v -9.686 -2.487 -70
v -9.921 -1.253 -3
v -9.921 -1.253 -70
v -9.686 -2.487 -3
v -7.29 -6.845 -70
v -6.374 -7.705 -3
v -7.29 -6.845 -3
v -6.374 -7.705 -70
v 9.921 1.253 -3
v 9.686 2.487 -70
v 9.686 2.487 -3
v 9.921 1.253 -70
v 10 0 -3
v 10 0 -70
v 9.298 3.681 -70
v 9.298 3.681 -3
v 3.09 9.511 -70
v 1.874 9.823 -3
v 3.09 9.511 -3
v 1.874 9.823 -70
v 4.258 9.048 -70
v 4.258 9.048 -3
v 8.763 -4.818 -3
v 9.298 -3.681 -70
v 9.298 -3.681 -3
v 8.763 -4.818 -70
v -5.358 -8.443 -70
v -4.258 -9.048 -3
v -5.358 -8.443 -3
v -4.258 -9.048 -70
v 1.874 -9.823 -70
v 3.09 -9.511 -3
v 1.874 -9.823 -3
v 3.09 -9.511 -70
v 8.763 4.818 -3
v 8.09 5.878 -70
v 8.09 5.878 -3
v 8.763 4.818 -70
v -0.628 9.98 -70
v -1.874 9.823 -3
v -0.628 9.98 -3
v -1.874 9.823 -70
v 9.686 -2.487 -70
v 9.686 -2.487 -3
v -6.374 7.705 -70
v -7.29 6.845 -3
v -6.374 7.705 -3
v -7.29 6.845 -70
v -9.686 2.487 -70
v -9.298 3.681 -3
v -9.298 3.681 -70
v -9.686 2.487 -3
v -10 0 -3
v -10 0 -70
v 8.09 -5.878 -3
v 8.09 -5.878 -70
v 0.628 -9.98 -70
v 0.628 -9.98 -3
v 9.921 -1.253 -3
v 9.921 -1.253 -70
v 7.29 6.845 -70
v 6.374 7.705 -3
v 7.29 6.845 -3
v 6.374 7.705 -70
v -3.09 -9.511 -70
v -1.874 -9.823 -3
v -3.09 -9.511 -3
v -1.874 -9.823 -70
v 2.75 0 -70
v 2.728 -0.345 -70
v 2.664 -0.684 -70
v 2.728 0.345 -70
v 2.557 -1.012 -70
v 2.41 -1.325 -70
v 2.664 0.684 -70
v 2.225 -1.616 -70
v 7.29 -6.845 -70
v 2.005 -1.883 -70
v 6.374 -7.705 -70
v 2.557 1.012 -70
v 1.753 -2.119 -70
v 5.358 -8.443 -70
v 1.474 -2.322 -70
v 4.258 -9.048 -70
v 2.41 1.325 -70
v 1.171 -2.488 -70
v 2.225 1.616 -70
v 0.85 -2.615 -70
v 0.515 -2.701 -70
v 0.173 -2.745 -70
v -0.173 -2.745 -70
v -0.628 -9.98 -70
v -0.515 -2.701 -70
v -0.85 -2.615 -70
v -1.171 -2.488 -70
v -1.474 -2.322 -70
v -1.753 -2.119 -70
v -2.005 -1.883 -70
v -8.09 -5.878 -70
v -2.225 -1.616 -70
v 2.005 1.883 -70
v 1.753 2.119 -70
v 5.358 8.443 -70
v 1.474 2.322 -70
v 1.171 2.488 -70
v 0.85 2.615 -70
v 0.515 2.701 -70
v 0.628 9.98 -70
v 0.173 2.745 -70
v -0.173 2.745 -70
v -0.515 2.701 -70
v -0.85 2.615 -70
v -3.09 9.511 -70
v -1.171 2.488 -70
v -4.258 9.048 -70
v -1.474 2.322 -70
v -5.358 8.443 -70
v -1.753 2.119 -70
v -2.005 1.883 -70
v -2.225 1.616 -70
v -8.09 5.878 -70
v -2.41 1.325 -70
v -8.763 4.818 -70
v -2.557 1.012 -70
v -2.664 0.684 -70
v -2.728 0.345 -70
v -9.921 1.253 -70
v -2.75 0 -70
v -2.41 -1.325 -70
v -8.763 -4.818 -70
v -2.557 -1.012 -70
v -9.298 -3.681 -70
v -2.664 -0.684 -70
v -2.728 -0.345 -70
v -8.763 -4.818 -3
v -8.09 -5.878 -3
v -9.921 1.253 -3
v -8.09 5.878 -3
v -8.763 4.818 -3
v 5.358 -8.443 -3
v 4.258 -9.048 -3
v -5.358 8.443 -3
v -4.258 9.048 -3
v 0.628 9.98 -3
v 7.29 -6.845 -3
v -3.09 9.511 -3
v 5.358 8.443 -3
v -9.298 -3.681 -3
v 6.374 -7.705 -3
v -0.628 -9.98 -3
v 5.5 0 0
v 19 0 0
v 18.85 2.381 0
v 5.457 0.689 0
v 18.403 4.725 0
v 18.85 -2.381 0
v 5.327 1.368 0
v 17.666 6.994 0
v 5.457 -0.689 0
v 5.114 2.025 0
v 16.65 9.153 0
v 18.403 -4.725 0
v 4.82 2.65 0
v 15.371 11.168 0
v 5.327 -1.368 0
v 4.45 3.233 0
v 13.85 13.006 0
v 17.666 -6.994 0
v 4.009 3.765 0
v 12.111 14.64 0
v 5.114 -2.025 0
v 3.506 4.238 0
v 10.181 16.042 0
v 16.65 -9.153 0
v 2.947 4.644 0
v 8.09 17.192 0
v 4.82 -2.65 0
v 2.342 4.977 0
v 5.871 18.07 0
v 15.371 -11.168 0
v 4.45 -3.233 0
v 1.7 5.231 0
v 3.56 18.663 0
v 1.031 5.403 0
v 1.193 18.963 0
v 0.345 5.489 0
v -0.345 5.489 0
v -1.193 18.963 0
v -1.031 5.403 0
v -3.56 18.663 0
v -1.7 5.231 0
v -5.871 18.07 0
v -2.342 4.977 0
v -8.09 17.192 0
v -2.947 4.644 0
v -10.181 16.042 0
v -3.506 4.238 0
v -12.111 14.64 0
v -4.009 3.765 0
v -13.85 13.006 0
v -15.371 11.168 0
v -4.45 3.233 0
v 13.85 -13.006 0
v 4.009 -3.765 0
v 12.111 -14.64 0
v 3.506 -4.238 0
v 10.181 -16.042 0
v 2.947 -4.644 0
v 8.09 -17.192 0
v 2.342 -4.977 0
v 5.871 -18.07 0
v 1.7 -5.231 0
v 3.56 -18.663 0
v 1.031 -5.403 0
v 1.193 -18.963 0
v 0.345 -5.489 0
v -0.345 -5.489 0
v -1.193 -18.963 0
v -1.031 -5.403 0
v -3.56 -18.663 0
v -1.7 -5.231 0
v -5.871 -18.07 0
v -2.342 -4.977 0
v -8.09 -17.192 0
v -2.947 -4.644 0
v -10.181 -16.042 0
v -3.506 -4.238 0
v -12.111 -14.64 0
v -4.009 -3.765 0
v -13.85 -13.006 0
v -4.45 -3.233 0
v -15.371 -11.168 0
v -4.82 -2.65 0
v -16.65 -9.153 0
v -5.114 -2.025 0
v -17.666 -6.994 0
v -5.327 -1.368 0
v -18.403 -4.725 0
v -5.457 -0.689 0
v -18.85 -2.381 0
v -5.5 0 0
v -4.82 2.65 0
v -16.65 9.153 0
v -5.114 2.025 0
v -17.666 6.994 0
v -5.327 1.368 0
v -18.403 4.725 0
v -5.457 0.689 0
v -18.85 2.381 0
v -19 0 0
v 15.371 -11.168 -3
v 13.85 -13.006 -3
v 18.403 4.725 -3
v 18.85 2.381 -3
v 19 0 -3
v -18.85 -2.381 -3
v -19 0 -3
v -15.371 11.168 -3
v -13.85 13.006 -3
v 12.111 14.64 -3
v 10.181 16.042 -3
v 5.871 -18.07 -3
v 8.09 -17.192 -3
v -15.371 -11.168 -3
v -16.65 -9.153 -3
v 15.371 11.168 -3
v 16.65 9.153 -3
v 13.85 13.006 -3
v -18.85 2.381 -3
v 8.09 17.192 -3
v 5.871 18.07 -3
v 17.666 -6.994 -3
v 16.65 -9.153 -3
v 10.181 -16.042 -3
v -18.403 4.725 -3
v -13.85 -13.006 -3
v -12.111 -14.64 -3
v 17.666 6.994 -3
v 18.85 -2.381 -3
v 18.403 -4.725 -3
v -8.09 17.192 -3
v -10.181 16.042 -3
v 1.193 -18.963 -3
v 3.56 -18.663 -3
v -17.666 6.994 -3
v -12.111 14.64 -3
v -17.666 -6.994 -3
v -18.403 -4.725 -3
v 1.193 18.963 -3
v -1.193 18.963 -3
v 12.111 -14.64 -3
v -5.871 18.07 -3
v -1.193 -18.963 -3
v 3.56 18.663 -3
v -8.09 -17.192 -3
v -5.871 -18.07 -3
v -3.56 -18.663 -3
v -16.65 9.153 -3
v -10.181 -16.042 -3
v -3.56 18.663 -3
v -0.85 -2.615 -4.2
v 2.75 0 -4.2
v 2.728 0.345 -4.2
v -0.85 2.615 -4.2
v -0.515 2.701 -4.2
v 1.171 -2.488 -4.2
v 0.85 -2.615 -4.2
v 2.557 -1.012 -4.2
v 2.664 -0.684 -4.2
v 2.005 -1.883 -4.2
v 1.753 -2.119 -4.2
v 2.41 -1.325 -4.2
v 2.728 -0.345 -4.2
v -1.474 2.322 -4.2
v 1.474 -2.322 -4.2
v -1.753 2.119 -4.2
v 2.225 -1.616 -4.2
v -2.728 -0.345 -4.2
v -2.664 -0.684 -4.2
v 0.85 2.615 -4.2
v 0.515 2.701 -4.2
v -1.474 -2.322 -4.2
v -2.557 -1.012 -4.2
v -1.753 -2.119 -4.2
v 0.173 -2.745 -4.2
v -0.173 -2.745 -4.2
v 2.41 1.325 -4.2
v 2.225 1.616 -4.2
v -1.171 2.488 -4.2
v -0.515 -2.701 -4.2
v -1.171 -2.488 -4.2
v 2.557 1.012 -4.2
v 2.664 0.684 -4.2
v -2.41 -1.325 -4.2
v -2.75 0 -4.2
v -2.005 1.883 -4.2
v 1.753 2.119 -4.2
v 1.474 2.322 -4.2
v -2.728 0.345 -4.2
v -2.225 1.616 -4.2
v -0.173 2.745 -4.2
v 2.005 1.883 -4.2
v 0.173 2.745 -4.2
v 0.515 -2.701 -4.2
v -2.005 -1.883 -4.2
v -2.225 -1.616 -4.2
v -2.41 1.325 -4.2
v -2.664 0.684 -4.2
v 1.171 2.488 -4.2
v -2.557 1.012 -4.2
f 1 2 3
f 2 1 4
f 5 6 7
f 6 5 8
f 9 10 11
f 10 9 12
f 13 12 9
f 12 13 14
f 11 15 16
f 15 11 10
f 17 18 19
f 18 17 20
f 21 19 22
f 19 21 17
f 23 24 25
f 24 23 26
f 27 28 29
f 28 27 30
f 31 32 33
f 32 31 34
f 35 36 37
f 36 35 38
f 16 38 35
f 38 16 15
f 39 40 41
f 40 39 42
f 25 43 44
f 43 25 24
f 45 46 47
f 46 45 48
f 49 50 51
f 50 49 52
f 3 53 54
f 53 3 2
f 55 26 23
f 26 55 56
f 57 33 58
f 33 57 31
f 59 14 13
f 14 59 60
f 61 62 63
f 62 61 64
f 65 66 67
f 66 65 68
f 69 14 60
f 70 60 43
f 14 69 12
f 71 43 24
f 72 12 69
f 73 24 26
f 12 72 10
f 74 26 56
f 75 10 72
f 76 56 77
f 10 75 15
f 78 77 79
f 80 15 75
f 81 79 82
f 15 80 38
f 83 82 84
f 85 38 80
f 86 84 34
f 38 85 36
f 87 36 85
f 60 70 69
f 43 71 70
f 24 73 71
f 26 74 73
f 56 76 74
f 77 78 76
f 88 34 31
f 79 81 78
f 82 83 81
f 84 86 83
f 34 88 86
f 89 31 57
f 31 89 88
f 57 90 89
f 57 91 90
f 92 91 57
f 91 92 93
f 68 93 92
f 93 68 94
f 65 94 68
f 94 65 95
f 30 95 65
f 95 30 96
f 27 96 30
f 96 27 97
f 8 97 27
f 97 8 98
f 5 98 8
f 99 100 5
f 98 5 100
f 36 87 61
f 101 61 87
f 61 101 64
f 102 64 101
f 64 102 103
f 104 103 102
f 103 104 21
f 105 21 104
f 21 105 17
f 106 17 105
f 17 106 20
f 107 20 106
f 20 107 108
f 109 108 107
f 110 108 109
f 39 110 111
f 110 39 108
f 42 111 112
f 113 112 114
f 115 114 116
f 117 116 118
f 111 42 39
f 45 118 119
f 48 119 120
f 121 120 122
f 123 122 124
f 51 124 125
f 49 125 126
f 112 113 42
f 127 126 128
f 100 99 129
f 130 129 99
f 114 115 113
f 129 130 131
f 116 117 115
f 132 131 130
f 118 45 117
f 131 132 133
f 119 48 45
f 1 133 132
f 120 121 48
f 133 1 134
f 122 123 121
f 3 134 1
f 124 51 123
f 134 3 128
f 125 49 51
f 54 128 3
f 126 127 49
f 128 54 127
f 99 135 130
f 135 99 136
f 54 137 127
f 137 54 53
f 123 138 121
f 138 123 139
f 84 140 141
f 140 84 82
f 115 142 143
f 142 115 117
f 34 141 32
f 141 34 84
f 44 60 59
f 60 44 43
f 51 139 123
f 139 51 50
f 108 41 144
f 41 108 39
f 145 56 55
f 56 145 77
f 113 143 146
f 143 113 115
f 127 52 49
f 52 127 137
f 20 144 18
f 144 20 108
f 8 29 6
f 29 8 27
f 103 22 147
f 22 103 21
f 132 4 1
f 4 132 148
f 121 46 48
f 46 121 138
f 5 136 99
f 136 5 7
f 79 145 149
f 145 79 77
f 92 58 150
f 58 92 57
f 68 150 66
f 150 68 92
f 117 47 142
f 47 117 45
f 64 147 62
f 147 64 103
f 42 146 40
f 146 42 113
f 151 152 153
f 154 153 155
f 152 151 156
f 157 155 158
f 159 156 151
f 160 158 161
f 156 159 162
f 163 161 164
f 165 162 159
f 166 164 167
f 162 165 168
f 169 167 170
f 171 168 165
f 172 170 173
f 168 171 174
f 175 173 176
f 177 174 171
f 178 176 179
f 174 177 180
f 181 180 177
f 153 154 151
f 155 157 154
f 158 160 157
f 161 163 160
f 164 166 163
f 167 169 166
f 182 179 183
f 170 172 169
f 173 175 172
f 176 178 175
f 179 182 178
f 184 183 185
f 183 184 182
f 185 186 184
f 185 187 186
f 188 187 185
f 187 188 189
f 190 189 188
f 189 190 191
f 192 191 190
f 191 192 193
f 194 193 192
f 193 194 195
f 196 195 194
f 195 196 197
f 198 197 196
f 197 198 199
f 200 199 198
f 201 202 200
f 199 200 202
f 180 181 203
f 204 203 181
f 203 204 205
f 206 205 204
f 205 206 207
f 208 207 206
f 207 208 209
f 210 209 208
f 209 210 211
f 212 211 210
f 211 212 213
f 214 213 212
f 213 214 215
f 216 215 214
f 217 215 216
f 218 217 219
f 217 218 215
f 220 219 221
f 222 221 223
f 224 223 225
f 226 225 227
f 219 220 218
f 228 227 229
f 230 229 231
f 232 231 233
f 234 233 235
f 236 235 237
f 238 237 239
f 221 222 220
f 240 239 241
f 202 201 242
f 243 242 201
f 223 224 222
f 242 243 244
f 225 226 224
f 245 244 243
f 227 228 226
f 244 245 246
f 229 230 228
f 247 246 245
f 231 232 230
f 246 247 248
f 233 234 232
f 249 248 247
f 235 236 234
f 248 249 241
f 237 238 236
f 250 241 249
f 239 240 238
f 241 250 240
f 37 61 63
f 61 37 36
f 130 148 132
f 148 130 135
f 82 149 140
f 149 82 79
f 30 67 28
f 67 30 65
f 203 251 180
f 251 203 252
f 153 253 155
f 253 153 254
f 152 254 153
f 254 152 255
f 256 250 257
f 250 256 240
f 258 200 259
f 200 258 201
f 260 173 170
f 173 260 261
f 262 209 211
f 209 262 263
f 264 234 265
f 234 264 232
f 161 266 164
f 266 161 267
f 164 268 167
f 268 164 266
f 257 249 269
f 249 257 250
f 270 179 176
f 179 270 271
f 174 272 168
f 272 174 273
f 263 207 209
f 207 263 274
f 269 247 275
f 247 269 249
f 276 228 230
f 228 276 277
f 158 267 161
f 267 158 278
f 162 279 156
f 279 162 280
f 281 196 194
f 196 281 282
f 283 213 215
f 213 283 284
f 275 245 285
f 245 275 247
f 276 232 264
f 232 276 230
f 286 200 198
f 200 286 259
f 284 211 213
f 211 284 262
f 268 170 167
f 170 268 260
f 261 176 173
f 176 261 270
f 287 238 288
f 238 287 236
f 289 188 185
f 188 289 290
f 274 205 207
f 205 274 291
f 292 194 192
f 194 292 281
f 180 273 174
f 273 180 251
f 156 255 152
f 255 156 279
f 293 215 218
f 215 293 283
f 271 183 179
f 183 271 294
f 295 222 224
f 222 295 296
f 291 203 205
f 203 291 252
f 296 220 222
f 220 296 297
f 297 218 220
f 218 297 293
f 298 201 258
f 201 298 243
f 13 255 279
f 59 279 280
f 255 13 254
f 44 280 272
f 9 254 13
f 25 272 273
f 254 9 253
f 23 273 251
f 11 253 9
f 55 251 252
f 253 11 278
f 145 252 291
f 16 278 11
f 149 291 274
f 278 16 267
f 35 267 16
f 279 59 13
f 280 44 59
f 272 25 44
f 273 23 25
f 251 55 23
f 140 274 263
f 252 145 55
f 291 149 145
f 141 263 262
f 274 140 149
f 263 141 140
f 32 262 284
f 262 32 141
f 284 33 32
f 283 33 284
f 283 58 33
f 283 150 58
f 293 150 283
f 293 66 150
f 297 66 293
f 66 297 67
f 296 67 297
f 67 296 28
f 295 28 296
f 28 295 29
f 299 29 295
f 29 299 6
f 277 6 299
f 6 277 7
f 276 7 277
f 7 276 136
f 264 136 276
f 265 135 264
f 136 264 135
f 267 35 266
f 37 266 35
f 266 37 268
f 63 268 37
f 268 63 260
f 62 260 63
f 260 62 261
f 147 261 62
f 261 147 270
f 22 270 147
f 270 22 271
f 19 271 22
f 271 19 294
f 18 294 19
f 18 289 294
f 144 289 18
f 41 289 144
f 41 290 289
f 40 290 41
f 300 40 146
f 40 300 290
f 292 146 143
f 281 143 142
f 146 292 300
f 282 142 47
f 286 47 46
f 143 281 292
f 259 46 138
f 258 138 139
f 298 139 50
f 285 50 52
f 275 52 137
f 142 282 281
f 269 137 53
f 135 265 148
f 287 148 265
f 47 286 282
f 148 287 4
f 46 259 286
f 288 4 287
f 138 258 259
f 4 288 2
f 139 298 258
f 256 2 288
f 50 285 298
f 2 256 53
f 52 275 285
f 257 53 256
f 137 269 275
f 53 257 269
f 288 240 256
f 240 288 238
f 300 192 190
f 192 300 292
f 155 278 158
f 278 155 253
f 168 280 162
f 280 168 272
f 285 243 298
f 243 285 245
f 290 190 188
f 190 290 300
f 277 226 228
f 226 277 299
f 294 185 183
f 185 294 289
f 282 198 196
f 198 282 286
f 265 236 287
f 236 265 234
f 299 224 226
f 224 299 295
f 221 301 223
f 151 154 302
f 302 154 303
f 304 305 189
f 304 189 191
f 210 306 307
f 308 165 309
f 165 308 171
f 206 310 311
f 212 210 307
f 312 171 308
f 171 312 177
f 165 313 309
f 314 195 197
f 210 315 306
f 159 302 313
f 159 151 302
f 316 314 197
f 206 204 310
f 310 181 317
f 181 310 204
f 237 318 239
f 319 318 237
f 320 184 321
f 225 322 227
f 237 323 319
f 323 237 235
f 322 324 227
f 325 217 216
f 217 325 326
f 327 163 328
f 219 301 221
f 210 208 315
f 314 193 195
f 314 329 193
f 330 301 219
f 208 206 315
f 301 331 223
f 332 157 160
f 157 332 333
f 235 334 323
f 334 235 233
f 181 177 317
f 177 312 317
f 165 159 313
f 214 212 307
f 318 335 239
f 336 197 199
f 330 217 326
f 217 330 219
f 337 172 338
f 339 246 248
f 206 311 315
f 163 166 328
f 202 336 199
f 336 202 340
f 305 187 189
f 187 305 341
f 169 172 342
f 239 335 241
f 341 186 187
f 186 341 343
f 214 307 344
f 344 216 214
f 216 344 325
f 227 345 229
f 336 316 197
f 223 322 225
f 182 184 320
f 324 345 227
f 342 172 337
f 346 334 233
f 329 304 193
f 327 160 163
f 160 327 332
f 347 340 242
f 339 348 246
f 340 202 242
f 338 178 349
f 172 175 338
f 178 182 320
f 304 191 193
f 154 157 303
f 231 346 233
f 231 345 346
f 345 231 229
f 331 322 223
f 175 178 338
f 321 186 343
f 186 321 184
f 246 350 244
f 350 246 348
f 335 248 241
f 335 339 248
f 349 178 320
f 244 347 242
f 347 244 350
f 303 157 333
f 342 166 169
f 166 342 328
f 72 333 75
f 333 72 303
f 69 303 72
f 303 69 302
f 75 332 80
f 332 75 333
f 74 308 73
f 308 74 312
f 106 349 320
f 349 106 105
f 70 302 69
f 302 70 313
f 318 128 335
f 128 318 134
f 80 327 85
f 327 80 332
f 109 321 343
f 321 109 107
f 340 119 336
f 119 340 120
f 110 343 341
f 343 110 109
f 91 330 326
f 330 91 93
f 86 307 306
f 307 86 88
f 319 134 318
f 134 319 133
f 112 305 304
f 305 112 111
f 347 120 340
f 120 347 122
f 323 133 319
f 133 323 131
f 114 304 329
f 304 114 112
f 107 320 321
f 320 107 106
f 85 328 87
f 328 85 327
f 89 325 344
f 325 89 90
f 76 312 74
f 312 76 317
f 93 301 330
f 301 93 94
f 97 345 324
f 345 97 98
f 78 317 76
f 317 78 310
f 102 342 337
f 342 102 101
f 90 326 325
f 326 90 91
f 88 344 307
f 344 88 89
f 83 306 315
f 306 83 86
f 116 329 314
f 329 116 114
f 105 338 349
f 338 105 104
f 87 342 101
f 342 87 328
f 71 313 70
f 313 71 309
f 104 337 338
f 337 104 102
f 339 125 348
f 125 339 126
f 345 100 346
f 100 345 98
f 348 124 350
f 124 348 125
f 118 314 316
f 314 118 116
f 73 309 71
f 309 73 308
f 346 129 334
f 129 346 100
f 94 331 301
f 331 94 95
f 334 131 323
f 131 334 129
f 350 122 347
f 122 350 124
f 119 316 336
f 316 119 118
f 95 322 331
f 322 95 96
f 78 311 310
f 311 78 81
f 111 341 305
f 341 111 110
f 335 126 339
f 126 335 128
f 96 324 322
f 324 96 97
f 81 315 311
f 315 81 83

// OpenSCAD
$fn = 50;


difference() {
	union() {
		translate(v = [0, 0, -70.0000000000]) {
			cylinder(h = 70, r = 10.0000000000);
		}
		translate(v = [0, 0, -3.0000000000]) {
			cylinder(h = 3, r = 19.0000000000);
		}
	}
	union() {
		translate(v = [0, 0, 0]) {
			rotate(a = [0, 0, 0]) {
				difference() {
					union() {
						#translate(v = [0, 0, -70.0000000000]) {
							cylinder(h = 70, r = 2.2500000000);
						}
						#translate(v = [0, 0, -4.2000000000]) {
							cylinder(h = 4.2000000000, r = 10.0000000000, r1 = 2.7500000000, r2 = 5.5000000000);
						}
						#translate(v = [0, 0, -70.0000000000]) {
							cylinder(h = 70, r = 2.7500000000);
						}
						#translate(v = [0, 0, -70.0000000000]) {
							cylinder(h = 70, r = 2.2500000000);
						}
					}
					union();
				}
			}
		}
	}
}
